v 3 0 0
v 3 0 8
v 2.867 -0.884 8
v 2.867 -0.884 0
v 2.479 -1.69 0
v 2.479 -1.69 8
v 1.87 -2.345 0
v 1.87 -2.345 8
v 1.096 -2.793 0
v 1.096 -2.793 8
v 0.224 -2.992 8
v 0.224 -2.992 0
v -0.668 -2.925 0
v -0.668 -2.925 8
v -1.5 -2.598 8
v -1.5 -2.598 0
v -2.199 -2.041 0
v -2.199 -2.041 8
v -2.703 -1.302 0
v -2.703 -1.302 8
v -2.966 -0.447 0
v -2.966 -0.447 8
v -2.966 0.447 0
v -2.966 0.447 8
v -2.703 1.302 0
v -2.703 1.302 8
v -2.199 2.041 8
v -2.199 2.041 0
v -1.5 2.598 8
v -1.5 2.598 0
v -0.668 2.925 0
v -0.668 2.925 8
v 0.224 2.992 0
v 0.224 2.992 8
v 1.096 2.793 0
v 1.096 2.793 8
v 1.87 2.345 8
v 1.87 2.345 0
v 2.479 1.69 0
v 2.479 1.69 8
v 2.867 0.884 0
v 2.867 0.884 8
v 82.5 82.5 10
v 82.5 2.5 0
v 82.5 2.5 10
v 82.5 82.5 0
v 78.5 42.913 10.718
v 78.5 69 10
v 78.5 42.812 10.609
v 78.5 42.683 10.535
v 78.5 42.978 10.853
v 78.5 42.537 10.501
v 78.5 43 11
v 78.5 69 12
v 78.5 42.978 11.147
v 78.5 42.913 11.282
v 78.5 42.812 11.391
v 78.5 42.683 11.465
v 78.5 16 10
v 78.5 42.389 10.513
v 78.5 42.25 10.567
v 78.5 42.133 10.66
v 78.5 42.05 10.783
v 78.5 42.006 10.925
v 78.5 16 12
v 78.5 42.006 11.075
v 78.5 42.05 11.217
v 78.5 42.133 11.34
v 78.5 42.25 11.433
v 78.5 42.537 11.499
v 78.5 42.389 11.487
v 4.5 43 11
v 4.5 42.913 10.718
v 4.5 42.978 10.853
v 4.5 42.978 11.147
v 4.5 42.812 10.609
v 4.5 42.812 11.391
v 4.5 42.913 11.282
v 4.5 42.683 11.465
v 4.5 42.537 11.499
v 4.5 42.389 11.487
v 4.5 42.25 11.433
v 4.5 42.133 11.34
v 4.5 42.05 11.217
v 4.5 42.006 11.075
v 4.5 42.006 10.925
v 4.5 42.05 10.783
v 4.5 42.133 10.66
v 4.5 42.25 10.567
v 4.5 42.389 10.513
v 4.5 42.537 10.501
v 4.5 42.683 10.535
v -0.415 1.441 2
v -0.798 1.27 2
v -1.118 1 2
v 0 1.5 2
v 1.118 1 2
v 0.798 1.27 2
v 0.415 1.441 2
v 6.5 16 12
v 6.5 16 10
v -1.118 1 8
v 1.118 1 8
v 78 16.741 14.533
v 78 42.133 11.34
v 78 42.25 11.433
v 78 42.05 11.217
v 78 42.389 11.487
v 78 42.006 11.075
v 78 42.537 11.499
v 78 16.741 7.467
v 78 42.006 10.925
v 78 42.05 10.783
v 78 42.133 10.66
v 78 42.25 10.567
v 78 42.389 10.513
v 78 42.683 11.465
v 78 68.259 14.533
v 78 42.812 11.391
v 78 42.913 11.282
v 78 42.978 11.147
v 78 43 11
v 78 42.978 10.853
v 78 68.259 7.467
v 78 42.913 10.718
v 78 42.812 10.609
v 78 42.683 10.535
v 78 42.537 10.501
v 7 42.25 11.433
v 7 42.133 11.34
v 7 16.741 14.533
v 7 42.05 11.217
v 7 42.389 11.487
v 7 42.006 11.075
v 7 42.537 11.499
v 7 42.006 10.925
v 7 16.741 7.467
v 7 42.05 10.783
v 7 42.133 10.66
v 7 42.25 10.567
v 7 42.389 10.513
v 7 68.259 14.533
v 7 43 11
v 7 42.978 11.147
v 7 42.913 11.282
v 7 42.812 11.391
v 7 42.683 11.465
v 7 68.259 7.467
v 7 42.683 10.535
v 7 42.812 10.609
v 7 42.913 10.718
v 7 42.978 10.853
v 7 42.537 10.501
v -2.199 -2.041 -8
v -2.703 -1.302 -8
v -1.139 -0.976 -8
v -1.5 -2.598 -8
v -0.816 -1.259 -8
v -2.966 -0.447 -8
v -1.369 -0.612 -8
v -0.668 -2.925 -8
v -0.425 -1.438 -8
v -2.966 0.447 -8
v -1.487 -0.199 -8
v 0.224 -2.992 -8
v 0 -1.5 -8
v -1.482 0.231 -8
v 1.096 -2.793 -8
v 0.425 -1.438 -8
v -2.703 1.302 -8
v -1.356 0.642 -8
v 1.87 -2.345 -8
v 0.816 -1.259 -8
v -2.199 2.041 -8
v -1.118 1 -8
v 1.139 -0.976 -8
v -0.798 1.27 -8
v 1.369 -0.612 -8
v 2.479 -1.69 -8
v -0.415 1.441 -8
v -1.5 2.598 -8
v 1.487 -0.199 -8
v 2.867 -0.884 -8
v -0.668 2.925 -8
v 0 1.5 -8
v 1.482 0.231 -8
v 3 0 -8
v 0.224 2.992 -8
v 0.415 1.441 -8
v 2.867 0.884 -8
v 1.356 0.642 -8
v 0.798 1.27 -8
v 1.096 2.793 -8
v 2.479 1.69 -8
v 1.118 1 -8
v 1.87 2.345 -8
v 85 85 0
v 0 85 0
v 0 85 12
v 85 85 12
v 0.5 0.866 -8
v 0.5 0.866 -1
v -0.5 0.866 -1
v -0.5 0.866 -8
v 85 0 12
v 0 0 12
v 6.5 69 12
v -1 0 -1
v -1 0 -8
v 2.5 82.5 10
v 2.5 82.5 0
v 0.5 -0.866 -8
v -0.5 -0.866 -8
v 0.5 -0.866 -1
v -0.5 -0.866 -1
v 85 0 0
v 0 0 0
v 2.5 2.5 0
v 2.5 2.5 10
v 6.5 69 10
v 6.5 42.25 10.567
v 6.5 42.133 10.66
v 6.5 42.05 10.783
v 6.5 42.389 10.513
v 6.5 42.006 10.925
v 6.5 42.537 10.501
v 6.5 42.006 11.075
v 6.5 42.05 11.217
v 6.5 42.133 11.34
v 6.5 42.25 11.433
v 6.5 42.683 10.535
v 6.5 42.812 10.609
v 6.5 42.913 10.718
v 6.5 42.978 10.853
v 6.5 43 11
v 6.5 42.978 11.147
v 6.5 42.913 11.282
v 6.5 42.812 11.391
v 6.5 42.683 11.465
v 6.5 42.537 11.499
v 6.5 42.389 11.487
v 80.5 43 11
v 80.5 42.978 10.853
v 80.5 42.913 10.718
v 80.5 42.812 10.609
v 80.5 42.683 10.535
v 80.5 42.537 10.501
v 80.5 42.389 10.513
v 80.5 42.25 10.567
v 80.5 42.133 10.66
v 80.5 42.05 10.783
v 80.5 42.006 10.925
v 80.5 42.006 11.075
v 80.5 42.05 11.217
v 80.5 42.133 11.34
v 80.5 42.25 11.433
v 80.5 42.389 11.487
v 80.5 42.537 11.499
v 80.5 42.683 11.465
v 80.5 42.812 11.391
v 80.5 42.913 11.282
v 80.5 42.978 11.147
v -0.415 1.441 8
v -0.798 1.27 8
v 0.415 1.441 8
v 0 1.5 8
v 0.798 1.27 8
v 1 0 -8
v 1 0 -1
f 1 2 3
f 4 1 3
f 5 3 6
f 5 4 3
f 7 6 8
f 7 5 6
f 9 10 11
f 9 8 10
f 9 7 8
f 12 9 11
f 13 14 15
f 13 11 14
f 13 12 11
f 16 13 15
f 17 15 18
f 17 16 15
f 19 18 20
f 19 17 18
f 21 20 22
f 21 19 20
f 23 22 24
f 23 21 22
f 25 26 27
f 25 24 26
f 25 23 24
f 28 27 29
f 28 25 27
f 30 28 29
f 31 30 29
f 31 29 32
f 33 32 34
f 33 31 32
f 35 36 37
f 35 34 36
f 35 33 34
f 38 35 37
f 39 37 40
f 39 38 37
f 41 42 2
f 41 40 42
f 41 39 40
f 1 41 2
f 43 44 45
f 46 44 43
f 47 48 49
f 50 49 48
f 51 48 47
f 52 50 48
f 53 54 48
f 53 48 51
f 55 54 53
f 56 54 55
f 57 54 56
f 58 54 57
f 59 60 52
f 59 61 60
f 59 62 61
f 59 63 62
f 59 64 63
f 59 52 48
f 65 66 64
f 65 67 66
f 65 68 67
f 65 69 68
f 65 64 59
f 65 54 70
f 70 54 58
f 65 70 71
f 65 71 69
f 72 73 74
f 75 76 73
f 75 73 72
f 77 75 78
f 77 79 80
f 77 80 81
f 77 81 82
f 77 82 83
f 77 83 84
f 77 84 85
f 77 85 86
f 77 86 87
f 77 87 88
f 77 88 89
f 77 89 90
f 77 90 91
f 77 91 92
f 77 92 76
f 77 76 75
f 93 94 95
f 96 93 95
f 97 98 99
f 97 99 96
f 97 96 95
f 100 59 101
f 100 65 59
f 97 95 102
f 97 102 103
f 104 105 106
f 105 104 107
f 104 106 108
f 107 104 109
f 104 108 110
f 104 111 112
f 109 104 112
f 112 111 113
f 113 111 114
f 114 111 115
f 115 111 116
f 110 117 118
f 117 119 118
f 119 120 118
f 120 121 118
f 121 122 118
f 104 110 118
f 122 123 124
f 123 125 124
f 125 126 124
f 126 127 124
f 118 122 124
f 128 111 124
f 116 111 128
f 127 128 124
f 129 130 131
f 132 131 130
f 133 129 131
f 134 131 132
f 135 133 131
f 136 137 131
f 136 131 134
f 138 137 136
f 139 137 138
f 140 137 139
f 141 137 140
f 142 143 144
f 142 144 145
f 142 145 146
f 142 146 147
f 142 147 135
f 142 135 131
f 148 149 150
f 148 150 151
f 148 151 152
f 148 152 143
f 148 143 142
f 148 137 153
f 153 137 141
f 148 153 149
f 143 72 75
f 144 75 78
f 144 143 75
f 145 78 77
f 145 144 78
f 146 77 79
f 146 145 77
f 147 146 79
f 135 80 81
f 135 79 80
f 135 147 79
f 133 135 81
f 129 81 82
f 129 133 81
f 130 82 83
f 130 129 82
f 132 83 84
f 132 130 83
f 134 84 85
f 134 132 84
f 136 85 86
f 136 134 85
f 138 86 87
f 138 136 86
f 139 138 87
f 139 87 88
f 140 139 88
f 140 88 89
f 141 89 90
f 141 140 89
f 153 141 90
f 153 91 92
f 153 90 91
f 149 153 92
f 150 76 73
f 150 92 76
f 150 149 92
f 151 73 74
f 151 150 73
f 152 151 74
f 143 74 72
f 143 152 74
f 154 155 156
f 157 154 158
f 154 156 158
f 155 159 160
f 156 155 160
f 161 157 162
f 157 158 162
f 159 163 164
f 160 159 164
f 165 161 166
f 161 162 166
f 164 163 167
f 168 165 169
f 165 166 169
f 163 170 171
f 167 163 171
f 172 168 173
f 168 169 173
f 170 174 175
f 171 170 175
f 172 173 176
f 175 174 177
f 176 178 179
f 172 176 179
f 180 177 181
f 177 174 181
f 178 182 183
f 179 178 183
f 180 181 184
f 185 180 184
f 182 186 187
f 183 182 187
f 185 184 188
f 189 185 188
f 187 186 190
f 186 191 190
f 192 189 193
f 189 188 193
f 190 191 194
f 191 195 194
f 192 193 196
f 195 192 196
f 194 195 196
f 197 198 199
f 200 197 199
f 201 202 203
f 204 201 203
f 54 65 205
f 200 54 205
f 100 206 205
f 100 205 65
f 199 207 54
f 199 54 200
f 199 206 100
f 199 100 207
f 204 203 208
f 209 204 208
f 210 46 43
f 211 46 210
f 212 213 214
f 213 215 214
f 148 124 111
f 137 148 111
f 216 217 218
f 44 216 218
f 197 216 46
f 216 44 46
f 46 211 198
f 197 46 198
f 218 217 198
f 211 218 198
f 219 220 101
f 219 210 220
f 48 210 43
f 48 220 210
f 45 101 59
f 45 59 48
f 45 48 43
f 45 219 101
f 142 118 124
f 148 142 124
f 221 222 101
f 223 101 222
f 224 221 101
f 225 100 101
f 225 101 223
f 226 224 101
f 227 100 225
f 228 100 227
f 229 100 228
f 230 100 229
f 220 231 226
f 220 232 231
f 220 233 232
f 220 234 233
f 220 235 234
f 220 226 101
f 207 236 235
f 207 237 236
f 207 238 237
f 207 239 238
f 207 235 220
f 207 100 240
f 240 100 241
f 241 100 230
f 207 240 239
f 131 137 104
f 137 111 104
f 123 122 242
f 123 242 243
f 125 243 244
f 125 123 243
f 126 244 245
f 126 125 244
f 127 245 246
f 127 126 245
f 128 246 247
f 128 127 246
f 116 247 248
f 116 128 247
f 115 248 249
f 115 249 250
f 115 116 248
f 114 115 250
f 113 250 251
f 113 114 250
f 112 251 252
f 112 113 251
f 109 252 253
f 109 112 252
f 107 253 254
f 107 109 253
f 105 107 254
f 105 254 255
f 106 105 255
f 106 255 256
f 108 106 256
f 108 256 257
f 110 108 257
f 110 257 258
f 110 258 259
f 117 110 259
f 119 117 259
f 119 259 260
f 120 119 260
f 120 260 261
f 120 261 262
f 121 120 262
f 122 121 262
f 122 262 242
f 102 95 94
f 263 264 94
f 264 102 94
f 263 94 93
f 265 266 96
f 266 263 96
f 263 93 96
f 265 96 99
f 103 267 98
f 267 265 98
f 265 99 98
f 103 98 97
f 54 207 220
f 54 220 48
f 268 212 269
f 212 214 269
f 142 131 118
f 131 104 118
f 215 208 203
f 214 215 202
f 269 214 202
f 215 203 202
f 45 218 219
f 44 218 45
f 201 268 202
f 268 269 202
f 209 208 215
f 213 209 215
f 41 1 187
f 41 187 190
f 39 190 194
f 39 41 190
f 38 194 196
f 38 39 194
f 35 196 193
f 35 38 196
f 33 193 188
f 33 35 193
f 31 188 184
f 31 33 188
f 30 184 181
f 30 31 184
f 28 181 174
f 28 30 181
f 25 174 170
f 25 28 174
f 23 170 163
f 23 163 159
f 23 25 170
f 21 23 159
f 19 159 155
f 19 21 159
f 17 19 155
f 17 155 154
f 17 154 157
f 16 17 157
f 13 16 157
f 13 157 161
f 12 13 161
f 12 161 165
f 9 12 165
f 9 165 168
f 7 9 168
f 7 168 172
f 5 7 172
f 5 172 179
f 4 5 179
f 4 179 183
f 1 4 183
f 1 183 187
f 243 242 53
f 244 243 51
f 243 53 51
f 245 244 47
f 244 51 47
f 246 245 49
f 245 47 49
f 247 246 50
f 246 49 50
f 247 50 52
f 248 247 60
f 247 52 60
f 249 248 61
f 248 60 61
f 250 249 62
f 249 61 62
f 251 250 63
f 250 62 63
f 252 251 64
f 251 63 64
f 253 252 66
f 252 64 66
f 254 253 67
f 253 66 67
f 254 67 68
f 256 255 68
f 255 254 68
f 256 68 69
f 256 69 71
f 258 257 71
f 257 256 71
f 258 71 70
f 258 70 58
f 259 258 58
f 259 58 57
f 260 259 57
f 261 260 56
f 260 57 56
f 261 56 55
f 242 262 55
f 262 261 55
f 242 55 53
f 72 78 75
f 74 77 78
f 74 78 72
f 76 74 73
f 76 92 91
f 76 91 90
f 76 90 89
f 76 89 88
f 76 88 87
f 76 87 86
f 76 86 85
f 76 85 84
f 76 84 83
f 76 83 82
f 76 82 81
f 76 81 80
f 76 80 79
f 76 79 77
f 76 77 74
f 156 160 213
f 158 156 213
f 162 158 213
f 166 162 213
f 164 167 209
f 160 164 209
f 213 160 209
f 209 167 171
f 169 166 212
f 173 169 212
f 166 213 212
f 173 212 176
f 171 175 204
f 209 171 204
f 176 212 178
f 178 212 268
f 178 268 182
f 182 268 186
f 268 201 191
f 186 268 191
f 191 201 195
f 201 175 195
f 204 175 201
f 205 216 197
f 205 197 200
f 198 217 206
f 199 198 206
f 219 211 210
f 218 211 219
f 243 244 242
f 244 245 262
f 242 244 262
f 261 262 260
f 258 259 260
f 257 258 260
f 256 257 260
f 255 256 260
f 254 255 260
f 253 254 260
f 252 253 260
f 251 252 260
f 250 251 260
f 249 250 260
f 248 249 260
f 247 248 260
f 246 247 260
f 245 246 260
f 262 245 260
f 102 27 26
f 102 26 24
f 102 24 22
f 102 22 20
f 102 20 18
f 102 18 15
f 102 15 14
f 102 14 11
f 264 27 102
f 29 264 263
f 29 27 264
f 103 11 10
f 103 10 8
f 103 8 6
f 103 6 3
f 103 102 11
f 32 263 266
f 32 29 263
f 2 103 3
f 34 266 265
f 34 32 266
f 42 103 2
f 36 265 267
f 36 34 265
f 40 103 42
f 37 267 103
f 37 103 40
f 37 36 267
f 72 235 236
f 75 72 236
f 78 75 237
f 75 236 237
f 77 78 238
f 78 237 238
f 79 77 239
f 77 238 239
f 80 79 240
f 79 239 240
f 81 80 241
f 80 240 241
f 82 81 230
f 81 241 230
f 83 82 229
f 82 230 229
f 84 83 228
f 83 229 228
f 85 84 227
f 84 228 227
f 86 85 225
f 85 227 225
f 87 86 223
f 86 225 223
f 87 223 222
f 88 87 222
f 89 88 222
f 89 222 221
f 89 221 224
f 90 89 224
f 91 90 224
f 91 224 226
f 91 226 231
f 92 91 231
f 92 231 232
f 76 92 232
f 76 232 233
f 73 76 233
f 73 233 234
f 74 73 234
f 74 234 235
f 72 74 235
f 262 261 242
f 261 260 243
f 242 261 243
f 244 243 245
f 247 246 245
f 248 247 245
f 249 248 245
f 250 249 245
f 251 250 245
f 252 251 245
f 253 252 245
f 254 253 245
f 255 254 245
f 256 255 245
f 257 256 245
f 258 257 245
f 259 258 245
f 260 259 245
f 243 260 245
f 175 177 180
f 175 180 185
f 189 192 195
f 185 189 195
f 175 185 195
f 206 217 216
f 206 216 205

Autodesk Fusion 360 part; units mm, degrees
sketch "Sketch1" plane through (0, 0, 0) normal (0, 0, 1) x (1, 0, 0)
  circle A0 centre (0, 0) radius 1.5
  circle A1 centre (0, 0) radius 3
  line L0 (-1.118, 1) -> (1.118, 1)
  line L1 (-2.5981, -1.5) -> (2.5981, -1.5) construction
  dimension "d1" = 3
  dimension "d2" = 1.5
  dimension "d14" = 2.5
extrude "Extrude1" add sketch "Sketch1" along normal mid plane 16 contours A0 L0 | A0 L0 | A1
sketch "Sketch2" plane through (0, 0, 0) normal (0, 0, 1) x (1, 0, 0)
  line L0 (-0.5, -0.866) -> (0.5, -0.866)
  line L1 (0.5, -0.866) -> (1, 0)
  line L2 (1, 0) -> (0.5, 0.866)
  line L3 (0.5, 0.866) -> (-0.5, 0.866)
  line L4 (-0.5, 0.866) -> (-1, 0)
  line L5 (-1, 0) -> (-0.5, -0.866)
  dimension "d5" = 1
extrude "Extrude2" cut sketch "Sketch2" against normal up to surface (7 mm away) from surface at -1
extrude "Extrude3" cut sketch "Sketch1" along normal up to surface (6 mm away) from surface at 2 contours A0 L0 picked at (-0.3224, 1.0488)

Autodesk Fusion 360 part; units mm, degrees
box "BoxPrimitive3" add length 85 width 85 height 12 placed x (0, 1, 0) y (-1, 0, 0) z (0, 0, 1) at (85, 0, 0) makes body 1 in component "panel"
ref_plane "WorkPlane1" through (42.5, 42.5, 12) normal (0, 0, 1) x (0, 1, 0) in component "panel"
sketch "Sketch5" plane through (42.5, 42.5, 12) normal (0, 0, 1) x (1, 0, 0) in component "panel"
  line L0 (-36, 26.5) -> (36, 26.5)
  line L1 (36, 26.5) -> (36, -26.5)
  line L2 (36, -26.5) -> (-36, -26.5)
  line L3 (-36, -26.5) -> (-36, 26.5)
  dimension "d59" = 72
  dimension "d60" = 53
  dimension "d61" = 36
  dimension "d63" = 26.5
extrude "Extrude3" cut sketch "Sketch5" against normal through all bodies 1 in component "panel"
ref_plane "WorkPlane2" through (42.5, 42.5, 0) normal (0, 0, -1) x (0, -1, 0) in component "panel"
sketch "Sketch7" plane through (42.5, 42.5, 0) normal (0, 0, -1) x (1, 0, 0) in component "panel"
  line L0 (-40, 40) -> (40, 40)
  line L1 (40, 40) -> (40, -40)
  line L2 (40, -40) -> (-40, -40)
  line L3 (-40, -40) -> (-40, 40)
  line L4 (-42.5, 42.5) -> (-42.5, -42.5)
  line L5 (42.5, -42.5) -> (42.5, 42.5)
  line L6 (42.5, 42.5) -> (-42.5, 42.5)
  line L7 (-42.5, -42.5) -> (42.5, -42.5)
  dimension "d110" = 2.5
  dimension "d112" = 2.5
  dimension "d113" = 2.5
  dimension "d114" = 2.5
extrude "Extrude4" cut sketch "Sketch7" against normal blind 10 contours L0 L1 L2 L3 bodies 1 in component "panel"
ref_plane "WorkPlane1" through (42.5, 42.5, 11) normal (-1, 0, 0) x (0, 1, 0) in component "Button"
sketch "Sketch3" plane through (42.5, 42.5, 11) normal (-1, 0, 0) x (0, 1, 0) in component "Button"
  line L0 (-25.7589, 3.5328) -> (-25.7589, -3.5328)
  line L1 (-25.7589, -3.5328) -> (25.7589, -3.5328)
  line L2 (25.7589, -3.5328) -> (25.7589, 3.5328)
  line L3 (25.7589, 3.5328) -> (-25.7589, 3.5328)
  line L4 (-25.7589, 3.5328) -> (25.7589, -3.5328) construction
  line L5 (-25.7589, -3.5328) -> (25.7589, 3.5328) construction
  line L6 (-25.7589, -3.5328) -> (-24.8077, 3.4023) construction
  line L7 (25.7589, -3.5328) -> (24.8077, 3.4023) construction
  line L8 (0, 0) -> (0, -3.5328) construction
  dimension "d96" = 7
  dimension "d97" = 52
extrude "Extrude1" add sketch "Sketch3" along normal mid plane 71 separate body makes body 2 in component "Button"
ref_plane "WorkPlane4" through (42.5, 42.5, 11) normal (1, 0, 0) x (0, -1, 0) in component "panel"
sketch "Sketch9" plane through (42.5, 42.5, 11) normal (1, 0, 0) x (0, 1, 0) in component "panel"
  circle A0 centre (0, 0) radius 0.5
  dimension "d100" = 1
extrude "Extrude6" cut sketch "Sketch9" along normal mid plane 76 bodies 1 in component "panel"
sketch "Sketch4" plane through (42.5, 42.5, 11) normal (-1, 0, 0) x (0, 1, 0) in component "Button"
  circle A0 centre (0, 0) radius 0.5
  dimension "d103" = 1
extrude "Extrude2" add sketch "Sketch4" along normal mid plane 76 bodies 2 in component "Button"
component "panel" placed x (1, 0, 0) y (0, 1, 0) z (0, 0, 1) at (0, 0, 0)
component "Button" placed x (1, 0, 0) y (0, 1, 0) z (0, 0, 1) at (0, 0, 0)
